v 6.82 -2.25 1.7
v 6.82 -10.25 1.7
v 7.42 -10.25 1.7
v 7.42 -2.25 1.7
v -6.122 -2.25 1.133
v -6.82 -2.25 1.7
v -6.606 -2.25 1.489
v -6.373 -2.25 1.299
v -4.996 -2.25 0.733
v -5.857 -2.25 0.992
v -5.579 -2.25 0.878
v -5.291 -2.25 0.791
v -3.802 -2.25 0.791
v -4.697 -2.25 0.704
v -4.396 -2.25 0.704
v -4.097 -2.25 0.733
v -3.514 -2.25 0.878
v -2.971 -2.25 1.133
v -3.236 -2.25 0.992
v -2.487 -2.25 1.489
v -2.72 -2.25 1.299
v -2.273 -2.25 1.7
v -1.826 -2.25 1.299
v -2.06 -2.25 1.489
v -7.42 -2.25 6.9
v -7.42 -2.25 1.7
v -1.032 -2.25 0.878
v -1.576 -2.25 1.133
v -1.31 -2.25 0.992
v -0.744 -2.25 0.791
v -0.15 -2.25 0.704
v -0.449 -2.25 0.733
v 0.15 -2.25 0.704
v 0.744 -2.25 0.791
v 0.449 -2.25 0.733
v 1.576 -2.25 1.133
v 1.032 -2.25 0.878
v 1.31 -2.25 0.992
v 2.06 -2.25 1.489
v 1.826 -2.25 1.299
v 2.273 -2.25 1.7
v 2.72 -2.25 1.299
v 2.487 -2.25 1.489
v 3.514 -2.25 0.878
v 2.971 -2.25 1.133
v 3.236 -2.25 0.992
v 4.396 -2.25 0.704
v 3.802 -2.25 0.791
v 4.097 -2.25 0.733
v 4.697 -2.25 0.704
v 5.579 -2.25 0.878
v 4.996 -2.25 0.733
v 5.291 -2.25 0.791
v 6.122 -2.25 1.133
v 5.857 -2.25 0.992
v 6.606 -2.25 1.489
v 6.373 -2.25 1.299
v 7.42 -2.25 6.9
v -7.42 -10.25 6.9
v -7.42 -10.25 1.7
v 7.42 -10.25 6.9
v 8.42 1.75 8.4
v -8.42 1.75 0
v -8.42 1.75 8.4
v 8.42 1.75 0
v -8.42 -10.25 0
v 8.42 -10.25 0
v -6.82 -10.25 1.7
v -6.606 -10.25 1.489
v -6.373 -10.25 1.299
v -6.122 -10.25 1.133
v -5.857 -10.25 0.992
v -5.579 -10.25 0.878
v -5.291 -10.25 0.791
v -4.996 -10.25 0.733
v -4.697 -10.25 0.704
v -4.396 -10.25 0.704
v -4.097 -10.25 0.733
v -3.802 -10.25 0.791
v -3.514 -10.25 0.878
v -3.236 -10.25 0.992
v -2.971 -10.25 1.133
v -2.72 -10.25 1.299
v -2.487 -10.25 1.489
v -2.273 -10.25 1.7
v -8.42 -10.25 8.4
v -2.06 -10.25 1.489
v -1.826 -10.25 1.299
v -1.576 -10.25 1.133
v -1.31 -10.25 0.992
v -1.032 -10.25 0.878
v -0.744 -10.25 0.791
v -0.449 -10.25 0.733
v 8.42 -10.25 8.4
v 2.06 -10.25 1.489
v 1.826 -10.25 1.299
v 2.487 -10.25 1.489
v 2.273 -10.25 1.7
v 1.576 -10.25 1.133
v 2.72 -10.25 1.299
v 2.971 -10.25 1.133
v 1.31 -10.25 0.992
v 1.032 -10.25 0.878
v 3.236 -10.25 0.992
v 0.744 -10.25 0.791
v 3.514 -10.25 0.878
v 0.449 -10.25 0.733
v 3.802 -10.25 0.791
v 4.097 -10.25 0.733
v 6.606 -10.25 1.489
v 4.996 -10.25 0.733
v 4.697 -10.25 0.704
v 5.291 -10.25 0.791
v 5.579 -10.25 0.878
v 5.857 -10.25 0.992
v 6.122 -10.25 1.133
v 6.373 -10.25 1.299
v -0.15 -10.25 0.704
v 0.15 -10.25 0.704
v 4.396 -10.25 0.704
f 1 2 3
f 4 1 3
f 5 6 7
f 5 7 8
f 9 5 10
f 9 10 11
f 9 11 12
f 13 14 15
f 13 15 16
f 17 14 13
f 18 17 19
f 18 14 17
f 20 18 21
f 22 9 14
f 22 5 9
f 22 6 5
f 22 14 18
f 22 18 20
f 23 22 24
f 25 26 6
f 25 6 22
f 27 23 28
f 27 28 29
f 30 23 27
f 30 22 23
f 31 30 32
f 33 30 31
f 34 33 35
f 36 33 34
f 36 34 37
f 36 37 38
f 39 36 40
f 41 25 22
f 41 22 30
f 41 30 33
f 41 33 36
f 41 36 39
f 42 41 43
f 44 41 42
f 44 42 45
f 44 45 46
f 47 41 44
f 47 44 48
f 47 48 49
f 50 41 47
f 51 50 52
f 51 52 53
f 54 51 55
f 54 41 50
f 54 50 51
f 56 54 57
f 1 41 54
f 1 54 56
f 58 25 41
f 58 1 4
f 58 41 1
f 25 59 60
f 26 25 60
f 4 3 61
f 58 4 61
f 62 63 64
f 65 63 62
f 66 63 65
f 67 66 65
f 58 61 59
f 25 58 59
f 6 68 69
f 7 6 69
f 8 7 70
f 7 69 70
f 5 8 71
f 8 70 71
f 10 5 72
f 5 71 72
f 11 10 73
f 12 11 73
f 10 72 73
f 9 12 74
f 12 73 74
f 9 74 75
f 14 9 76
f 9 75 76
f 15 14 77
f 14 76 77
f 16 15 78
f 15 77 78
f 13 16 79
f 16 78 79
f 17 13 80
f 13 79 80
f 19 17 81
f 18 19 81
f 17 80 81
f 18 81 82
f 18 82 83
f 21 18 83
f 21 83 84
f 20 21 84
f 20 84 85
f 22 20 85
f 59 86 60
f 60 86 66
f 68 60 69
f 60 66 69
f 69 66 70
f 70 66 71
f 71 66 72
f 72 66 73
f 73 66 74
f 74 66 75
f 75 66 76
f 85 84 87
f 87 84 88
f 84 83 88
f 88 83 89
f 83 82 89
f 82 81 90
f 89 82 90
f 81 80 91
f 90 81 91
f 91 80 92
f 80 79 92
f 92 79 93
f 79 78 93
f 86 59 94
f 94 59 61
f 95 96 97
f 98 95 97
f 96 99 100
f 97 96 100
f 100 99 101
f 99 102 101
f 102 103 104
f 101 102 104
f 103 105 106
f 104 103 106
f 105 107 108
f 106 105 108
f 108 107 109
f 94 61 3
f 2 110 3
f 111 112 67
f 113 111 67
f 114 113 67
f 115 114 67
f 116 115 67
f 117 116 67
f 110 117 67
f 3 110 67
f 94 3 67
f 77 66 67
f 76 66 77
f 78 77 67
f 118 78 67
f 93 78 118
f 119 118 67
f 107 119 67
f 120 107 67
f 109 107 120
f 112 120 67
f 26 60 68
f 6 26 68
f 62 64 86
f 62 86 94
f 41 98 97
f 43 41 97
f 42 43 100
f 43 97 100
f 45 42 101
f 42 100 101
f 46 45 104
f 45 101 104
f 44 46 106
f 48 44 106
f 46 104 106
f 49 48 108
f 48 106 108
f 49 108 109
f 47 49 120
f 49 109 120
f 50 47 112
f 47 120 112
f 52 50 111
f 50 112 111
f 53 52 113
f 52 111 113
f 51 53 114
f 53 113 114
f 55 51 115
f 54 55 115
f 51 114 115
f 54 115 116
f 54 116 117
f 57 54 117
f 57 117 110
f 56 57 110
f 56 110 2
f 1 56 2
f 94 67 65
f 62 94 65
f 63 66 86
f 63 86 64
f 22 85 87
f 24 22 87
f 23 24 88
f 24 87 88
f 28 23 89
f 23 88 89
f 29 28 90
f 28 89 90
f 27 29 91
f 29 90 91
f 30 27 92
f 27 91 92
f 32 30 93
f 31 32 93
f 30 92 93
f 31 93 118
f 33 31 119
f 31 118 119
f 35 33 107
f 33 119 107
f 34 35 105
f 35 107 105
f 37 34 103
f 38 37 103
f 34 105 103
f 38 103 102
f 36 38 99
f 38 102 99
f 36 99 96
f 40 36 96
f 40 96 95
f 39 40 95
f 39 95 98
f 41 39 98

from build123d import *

# Parameters (mm, degrees)
SKETCH1_W           = 16.84
SKETCH1_H           = 12
BOSS_EXTRUDE1_DEPTH = 8.4
CUT_EXTRUDE1_DEPTH  = 8


with BuildPart() as part:
    # Sketch1 → Boss-Extrude1 (new body)
    with BuildSketch(Plane.XY):
        with Locations((0, -4.25)):
            Rectangle(SKETCH1_W, SKETCH1_H)
    extrude(amount=BOSS_EXTRUDE1_DEPTH)

    # Sketch2 → Cut-Extrude1 (cut)
    with BuildSketch(Plane.XZ.offset(10.25)):
        with BuildLine():
            Line((7.42, 6.9), (-7.42, 6.9))
            Line((-7.42, 6.9), (-7.42, 1.7))
            Line((-7.42, 1.7), (-6.82, 1.7))
            ThreePointArc((-6.82, 1.7), (-4.546666667, 0.7), (-2.273333333, 1.7))
            ThreePointArc((-2.273333333, 1.7), (0, 0.7), (2.273333333, 1.7))
            ThreePointArc((2.273333333, 1.7), (4.546666667, 0.7), (6.82, 1.7))
            Line((6.82, 1.7), (7.42, 1.7))
            Line((7.42, 1.7), (7.42, 6.9))
        make_face()
    extrude(amount=-CUT_EXTRUDE1_DEPTH, mode=Mode.SUBTRACT)


solid = part.part
